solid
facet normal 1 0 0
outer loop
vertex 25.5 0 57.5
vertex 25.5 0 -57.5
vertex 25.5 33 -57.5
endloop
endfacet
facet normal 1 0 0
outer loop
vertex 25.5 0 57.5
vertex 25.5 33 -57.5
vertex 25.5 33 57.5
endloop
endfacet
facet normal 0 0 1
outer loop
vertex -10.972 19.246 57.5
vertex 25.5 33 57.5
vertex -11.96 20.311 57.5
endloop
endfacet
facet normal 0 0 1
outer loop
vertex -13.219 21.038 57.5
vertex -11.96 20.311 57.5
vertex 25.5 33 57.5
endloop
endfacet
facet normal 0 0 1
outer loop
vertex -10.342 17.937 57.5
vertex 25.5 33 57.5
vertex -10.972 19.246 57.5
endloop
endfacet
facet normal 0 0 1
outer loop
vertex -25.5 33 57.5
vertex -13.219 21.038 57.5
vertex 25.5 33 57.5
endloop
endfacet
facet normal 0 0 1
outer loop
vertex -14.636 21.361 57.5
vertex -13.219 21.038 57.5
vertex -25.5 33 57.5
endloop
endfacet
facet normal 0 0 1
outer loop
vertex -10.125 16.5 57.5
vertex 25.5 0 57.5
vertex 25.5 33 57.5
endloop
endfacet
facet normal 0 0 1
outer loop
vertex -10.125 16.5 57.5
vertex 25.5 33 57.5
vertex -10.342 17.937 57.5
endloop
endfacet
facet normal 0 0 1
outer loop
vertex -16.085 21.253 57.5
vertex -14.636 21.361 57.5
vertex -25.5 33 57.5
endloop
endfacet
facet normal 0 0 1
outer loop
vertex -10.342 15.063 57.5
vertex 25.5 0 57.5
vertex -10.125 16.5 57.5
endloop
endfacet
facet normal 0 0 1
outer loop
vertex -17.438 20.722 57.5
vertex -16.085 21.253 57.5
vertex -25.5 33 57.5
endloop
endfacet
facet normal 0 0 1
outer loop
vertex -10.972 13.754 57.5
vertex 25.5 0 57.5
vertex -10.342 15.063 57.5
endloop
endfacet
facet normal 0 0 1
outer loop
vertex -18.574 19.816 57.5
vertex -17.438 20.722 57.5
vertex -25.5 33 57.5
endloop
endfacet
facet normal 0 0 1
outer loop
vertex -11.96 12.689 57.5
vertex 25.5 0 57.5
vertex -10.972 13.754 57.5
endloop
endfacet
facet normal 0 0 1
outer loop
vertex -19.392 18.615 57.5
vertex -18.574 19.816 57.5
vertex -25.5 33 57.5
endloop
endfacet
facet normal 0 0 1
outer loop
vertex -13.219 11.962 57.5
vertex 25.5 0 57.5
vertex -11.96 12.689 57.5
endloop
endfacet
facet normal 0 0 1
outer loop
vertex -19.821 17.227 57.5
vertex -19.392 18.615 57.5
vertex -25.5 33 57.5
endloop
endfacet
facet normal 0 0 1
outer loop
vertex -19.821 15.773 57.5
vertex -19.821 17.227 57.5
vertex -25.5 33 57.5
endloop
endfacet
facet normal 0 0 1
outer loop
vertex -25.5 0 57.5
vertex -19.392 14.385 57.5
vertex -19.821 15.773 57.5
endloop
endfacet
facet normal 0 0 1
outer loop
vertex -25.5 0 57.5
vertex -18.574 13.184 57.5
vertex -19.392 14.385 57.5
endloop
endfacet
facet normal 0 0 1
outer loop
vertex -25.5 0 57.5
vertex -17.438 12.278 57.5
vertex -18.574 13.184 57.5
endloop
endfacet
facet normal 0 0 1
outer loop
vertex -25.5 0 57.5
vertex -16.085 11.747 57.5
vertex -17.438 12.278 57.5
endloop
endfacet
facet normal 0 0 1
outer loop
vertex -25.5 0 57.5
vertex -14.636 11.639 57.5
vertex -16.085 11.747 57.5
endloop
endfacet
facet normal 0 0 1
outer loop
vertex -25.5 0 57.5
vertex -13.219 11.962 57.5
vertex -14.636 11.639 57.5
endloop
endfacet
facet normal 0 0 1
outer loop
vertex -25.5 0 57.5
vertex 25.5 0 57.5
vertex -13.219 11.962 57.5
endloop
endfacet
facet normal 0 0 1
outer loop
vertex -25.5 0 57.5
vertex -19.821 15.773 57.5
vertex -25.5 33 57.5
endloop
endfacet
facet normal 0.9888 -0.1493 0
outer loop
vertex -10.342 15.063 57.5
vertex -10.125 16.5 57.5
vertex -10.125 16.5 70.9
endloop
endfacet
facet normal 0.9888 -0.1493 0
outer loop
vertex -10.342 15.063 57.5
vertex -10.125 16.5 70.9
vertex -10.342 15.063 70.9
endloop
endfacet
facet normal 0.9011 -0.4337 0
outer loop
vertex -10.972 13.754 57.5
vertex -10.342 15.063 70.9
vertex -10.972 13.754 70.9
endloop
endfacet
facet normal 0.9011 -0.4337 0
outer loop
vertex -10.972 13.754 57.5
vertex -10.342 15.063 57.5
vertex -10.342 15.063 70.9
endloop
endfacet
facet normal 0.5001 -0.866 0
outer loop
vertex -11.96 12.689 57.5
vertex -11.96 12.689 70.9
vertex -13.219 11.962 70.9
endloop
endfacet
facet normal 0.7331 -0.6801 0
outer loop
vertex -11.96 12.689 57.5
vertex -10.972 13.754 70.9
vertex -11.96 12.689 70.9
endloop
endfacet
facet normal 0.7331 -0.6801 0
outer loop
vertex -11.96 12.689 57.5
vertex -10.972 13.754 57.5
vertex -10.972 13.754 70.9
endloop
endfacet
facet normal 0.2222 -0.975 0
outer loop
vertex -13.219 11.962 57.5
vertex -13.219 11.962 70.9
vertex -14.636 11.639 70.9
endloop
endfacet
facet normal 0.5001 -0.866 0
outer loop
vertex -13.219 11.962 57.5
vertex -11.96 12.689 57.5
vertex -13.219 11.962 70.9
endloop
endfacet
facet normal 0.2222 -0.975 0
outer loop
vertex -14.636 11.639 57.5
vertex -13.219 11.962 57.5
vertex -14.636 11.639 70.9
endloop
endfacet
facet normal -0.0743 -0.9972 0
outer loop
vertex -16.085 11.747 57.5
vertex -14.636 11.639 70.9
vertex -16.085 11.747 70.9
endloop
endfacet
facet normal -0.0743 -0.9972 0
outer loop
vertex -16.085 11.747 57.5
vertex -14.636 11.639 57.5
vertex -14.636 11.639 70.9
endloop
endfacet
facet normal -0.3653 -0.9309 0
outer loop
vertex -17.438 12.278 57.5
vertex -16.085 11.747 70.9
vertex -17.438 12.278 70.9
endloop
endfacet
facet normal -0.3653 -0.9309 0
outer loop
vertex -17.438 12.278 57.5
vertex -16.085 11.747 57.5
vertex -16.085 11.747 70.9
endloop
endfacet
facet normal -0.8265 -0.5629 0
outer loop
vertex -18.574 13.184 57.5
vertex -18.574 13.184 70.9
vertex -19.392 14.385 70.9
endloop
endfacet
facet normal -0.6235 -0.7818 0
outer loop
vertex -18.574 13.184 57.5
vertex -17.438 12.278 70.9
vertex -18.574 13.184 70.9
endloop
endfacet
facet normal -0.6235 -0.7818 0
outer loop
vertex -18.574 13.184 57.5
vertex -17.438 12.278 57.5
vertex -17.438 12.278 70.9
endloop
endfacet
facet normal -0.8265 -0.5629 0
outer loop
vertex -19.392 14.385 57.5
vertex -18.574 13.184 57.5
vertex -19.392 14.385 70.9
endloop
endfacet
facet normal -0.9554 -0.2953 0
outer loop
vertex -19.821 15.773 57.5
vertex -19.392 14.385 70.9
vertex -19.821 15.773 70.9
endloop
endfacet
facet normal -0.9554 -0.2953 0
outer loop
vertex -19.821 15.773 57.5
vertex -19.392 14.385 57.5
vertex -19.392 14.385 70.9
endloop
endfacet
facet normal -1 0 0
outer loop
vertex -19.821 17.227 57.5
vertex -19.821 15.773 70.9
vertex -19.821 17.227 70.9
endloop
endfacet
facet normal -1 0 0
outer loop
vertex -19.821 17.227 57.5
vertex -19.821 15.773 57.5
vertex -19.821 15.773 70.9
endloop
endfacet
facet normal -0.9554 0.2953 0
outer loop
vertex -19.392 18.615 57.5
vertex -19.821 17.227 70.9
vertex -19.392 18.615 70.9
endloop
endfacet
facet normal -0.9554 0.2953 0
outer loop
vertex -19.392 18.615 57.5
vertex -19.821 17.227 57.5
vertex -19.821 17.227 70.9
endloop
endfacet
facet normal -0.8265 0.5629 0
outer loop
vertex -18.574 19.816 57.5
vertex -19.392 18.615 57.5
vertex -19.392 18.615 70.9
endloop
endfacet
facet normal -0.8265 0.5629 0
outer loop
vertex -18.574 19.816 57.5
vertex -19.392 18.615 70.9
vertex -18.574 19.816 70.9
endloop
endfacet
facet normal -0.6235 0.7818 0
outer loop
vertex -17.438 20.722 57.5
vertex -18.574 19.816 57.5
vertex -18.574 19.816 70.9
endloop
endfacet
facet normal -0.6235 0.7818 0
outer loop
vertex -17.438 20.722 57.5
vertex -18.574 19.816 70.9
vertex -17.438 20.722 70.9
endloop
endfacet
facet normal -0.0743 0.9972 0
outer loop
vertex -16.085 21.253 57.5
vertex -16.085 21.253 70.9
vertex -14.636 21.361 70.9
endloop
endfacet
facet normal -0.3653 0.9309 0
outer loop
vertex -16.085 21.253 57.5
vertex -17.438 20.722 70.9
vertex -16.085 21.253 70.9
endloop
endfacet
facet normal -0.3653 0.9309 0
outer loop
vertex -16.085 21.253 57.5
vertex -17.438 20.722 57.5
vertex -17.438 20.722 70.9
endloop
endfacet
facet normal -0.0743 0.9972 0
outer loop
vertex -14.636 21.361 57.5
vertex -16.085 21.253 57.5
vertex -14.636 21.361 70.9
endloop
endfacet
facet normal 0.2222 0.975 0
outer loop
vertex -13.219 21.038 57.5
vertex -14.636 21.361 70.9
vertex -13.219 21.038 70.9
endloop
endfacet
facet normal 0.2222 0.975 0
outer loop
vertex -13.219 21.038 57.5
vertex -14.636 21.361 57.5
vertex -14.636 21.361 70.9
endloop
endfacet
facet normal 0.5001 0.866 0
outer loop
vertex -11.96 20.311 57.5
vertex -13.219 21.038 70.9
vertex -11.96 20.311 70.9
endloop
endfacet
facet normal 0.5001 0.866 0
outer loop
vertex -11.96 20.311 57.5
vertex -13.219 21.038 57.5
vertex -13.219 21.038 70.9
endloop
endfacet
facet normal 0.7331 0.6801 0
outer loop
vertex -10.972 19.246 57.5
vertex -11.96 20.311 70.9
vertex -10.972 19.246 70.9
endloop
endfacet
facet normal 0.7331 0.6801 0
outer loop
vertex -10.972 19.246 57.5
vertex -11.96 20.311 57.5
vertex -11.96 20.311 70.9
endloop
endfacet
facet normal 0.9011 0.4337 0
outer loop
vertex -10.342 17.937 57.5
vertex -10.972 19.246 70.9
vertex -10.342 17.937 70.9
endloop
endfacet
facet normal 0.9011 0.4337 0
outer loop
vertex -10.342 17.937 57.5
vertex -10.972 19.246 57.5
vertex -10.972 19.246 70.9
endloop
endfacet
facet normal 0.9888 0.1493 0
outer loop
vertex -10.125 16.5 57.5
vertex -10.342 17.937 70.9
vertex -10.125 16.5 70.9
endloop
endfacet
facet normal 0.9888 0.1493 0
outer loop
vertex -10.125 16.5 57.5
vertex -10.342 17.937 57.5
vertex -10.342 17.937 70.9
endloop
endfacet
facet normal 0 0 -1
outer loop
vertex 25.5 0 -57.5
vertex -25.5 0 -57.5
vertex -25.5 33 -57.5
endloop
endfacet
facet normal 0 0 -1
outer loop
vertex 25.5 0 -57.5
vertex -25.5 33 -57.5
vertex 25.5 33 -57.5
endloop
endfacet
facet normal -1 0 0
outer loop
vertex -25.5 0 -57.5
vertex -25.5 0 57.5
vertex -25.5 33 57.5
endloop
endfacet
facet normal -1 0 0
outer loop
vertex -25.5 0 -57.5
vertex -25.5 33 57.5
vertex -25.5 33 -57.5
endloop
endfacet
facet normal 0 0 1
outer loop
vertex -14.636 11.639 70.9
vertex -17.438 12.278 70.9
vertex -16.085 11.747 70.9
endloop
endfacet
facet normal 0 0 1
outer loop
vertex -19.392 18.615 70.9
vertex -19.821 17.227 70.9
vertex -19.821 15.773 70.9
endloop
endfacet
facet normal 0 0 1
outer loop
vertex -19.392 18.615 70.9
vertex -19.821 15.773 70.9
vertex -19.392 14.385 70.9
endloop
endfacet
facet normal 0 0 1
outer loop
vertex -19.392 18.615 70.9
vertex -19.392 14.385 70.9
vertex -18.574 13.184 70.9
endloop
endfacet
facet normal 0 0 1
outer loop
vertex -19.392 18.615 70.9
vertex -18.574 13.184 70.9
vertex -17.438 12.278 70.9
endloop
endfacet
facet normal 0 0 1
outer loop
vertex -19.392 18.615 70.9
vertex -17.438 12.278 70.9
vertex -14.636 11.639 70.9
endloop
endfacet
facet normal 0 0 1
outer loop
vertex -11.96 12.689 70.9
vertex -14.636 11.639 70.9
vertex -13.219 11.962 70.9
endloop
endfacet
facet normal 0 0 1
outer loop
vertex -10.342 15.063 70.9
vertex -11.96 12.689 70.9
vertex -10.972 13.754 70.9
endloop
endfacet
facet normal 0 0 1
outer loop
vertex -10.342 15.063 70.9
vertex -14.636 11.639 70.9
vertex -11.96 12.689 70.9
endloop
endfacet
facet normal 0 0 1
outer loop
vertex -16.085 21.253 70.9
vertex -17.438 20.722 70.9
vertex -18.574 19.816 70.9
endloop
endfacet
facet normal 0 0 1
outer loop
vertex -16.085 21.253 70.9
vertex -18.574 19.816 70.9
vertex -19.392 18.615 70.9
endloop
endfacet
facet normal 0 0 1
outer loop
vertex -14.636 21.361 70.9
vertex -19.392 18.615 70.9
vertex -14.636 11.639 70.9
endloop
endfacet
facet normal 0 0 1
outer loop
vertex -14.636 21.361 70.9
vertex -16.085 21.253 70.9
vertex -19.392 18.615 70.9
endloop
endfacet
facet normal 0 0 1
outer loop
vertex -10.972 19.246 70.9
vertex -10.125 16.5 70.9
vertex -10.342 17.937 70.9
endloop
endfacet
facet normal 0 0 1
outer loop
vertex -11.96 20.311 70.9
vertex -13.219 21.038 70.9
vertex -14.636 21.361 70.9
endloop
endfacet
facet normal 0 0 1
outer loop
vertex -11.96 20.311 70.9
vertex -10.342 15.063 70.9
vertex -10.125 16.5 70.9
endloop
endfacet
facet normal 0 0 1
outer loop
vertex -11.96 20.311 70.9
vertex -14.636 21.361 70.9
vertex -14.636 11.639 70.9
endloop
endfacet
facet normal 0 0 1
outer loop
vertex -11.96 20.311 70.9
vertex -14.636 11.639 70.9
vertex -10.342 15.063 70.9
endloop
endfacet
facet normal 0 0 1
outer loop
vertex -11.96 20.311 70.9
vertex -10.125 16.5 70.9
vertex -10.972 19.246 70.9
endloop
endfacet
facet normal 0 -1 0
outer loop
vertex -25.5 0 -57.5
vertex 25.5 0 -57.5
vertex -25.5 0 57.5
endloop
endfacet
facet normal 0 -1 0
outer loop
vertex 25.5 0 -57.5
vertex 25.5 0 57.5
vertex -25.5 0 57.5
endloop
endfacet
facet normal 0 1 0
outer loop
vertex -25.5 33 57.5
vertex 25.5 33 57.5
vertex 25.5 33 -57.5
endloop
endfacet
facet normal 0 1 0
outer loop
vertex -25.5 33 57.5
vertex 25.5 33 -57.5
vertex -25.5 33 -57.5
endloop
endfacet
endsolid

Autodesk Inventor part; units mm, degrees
ref_plane "YZ Plane" through (0, 0, 0) normal (1, 0, 0) x (0, 1, 0)
ref_plane "XZ Plane" through (0, 0, 0) normal (0, 1, 0) x (-1, 0, 0)
ref_plane "XY Plane" through (0, 0, 0) normal (0, 0, 1) x (1, 0, 0)
sketch "Sketch1" plane through (0, 0, 0) normal (0, 1, 0) x (-1, 0, 0)
  line L0 (-25.5, 57.5) -> (25.5, 57.5)
  line L1 (25.5, 57.5) -> (25.5, -57.5)
  line L2 (25.5, -57.5) -> (-25.5, -57.5)
  line L3 (-25.5, -57.5) -> (-25.5, 57.5)
  line L4 (-25.5, 57.5) -> (25.5, -57.5) construction
  line L5 (25.5, 57.5) -> (-25.5, -57.5) construction
  point P0 (0, 0)
  dimension "d0" = 51
  dimension "d1" = 115
extrude "Extrusion1" add sketch "Sketch1" along normal blind 33
sketch "Sketch2" plane through (-25.5, 0, 57.5) normal (0, 0, 1) x (1, 0, 0)
  circle A0 centre (10.5, 16.5) radius 4.875
  line L0 (0, 0) -> (0, 33) projected
  point P0 (25.5, 0)
  point P1 (0, 16.5)
  dimension "d4" = 10.5
  dimension "d5" = 9.75
extrude "Extrusion2" add sketch "Sketch2" along normal blind 13.4
properties part number "Power brick"
